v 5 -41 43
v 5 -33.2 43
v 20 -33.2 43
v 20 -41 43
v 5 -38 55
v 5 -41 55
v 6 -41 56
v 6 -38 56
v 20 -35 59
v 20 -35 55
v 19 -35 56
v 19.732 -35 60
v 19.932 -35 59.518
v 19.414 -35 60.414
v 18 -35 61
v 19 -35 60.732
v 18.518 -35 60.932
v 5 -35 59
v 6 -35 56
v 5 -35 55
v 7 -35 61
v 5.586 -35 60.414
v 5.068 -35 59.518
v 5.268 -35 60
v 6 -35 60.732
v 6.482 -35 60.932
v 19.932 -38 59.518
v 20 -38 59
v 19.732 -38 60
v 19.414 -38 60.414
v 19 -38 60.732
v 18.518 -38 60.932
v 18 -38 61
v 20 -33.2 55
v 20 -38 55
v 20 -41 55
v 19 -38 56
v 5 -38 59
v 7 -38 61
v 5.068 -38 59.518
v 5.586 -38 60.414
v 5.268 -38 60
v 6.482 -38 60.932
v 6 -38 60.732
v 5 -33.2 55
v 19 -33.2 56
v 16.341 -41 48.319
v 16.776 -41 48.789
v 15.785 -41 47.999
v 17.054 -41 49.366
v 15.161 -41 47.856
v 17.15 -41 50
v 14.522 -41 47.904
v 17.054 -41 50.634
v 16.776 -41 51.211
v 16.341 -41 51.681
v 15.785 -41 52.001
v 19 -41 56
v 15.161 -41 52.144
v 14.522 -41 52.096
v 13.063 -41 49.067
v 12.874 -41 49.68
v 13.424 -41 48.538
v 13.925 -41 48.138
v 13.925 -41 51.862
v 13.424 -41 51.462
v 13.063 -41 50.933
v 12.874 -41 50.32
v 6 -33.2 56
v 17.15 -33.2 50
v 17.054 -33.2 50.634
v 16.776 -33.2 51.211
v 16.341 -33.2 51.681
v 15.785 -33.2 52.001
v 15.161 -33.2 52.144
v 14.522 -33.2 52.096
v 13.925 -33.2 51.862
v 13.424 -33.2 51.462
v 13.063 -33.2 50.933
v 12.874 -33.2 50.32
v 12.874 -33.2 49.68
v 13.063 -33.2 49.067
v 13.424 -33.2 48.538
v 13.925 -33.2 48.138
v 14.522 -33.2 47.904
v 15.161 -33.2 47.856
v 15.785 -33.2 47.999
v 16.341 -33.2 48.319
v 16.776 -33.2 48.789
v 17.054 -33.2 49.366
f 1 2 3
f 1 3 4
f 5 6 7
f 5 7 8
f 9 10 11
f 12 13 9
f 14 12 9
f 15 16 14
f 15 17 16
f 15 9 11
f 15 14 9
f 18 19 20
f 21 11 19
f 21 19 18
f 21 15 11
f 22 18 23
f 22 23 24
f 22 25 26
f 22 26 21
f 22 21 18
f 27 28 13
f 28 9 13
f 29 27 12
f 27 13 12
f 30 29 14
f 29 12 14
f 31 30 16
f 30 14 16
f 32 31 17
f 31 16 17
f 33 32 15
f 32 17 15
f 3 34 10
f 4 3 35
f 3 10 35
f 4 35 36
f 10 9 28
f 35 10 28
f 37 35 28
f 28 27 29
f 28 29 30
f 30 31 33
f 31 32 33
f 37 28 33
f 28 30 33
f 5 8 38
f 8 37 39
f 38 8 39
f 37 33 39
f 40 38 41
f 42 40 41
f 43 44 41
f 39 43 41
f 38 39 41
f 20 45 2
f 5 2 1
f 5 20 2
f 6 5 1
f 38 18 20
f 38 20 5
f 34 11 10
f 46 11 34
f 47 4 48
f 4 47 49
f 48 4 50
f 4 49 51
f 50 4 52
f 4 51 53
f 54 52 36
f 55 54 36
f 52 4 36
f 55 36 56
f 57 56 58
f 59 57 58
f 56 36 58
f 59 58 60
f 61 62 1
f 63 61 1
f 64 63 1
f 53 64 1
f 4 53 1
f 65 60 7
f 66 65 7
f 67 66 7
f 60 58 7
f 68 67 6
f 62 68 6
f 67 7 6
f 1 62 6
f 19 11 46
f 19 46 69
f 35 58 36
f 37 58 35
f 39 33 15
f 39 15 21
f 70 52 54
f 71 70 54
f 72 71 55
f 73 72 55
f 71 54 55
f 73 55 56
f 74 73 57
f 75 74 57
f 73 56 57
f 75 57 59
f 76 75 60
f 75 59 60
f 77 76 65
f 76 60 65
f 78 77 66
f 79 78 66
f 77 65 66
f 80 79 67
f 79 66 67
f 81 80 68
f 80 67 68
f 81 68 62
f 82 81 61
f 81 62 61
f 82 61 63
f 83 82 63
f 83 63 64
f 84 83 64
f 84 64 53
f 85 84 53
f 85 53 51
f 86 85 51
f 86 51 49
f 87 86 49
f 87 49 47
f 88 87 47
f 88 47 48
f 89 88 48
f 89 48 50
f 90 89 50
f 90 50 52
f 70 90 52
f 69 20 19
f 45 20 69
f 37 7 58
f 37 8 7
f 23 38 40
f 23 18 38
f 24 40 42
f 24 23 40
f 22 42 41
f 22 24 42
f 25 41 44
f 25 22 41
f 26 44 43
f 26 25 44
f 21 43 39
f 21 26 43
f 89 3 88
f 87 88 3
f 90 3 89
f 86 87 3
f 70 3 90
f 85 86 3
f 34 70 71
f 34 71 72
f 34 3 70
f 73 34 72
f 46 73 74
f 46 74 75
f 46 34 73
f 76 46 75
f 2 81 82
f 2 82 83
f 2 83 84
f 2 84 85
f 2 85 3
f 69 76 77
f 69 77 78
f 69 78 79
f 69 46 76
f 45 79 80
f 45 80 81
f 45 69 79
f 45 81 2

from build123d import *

# Parameters (mm, degrees)
SKETCH167_W         = 15
SKETCH167_H         = 3
PAD068_DEPTH        = 11
SKETCH168_W         = 15
SKETCH168_H         = 16
PAD069_DEPTH        = 3
FILLET078_R         = 2
SKETCH189_W         = 15
SKETCH189_H         = 11
PAD080_DEPTH        = 1.8
SKETCH169_R         = 2.15
POCKET089_DEPTH     = 7.801
CHAMFER024_SIZE     = 1
CHAMFER024_FACE13_W = 7.8
CHAMFER024_FACE13_H = 15
PAD081_DEPTH        = 2


with BuildPart() as part:
    # Sketch167 → Pad068 (new body)
    with BuildSketch(Plane.XY):
        with Locations((7.5, -1.5)):
            Rectangle(SKETCH167_W, SKETCH167_H)
    extrude(amount=-PAD068_DEPTH)

    # Sketch168 (on Face1 of Pad068) → Pad069 (join)
    with BuildSketch(Plane(origin=(0, 0, 0), x_dir=(-1, 0, 0), z_dir=(0, 1, 0))):
        with Locations((-7.5, -3)):
            Rectangle(SKETCH168_W, SKETCH168_H)
    extrude(amount=PAD069_DEPTH)

    # Fillet078
    fillet078_edges = [part.edges().sort_by_distance(p)[0] for p in [
        (0, 1.5, 5),
        (15, 1.5, 5),
    ]]
    fillet(fillet078_edges, radius=FILLET078_R)

    # Sketch189 (on Face8 of Fillet078) → Pad080 (join)
    with BuildSketch(Plane(origin=(0, 3, 0), x_dir=(-1, 0, 0), z_dir=(0, 1, 0))):
        with Locations((-7.5, -5.5)):
            Rectangle(SKETCH189_W, SKETCH189_H)
    extrude(amount=PAD080_DEPTH)

    # Sketch169 → Pocket089 (cut, through all)
    with BuildSketch(Plane.XZ.offset(3)):
        with Locations((10, -6)):
            Circle(SKETCH169_R)
    extrude(amount=-POCKET089_DEPTH, mode=Mode.SUBTRACT)

    # Chamfer024
    chamfer024_edges = [part.edges().sort_by_distance(p)[0] for p in [
        (15, -1.5, 0),
        (15, 3.9, 0),
        (0, 3.9, 0),
        (0, -1.5, 0),
    ]]
    chamfer(chamfer024_edges, length=CHAMFER024_SIZE)

    # Chamfer024 Face13 → Pad081 (add)
    with BuildSketch(Plane(origin=(7.5, 0.9, -11), x_dir=(0, -1, 0), z_dir=(0, 0, -1))):
        Rectangle(CHAMFER024_FACE13_W, CHAMFER024_FACE13_H)
    extrude(amount=PAD081_DEPTH)


with BuildPart() as part_1:
    # Body044 placement: moved
    add(part.part.moved(Location((5, -38, 56))))


solid = part_1.part
